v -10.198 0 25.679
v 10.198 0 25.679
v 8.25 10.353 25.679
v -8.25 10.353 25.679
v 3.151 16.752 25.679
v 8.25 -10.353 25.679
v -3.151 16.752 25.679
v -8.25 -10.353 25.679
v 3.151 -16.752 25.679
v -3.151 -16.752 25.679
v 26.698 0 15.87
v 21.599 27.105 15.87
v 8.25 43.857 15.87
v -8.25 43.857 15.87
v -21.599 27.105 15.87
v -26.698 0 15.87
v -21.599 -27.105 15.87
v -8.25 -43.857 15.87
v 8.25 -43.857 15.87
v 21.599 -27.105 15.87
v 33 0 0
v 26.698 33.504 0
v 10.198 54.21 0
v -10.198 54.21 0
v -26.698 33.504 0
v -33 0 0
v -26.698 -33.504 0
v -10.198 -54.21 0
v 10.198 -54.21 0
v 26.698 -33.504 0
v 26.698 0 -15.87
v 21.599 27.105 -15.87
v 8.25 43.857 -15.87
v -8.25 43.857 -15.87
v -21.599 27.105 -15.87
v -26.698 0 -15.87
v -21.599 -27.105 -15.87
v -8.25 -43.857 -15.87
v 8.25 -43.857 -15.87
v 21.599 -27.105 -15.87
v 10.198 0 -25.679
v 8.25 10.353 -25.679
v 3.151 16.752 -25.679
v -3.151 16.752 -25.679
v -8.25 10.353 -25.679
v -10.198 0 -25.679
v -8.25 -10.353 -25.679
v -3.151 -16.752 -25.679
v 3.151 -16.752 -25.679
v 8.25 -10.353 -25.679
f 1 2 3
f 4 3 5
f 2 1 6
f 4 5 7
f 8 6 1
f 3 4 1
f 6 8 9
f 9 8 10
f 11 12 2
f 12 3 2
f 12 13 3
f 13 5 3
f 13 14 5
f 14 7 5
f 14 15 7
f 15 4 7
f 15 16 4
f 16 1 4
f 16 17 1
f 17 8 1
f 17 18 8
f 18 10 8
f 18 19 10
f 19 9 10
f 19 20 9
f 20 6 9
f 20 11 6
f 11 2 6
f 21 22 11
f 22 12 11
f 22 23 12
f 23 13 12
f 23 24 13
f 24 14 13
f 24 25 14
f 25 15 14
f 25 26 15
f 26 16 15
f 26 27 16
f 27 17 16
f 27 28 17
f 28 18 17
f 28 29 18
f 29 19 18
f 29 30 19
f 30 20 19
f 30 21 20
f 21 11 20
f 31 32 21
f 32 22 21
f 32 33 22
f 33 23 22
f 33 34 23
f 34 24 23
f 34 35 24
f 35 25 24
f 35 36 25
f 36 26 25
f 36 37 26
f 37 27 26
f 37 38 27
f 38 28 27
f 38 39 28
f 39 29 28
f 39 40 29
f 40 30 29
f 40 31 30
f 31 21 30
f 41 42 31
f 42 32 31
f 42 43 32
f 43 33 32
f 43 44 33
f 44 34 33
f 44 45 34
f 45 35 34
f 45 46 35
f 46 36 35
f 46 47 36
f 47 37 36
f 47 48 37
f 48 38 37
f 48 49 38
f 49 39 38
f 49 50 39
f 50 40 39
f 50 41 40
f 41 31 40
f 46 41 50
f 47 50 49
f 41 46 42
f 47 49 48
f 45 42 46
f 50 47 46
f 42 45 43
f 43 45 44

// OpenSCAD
// Generated by SolidPython 1.0.1 on 2020-07-29 00:46:50


scale(v = [11, 19, 9]) {
	sphere(r = 3);
}
/***********************************************
*********      SolidPython code:      **********
************************************************
 
# import packages: SolidPython
from solid import *
from solid.utils import *
from itertools import chain, combinations, permutations


class Resize:

    def __init__(self, scad_file):
        self.scad_file = scad_file
        #self.scad_file = import_scad(scad_file)
        # cone/cylinder param:
        self.r1 = 0
        self.r2 = 0
        self.h = 0
        # rectangular prism param:
        self.w = 0
        self.l = 0
        # ellipse param:
        self.r = 0

    # import OpenScad code (file name corresponds to shape)


    # classify shape + parameters
    def assign(self, param1, param2, param3):
        if self.scad_file == 'cone.scad':
            self.r1 = param1
            self.r2 = param2
            self.h = param3
        elif self.scad_file == 'cylinder.scad':
            self.r1 = param1
            self.r2 = param2
            self.h = param3
        elif self.scad_file == 'rectangularPrism.scad':
            self.h = param1
            self.l = param2
            self.w = param3
        else:
            self.r = param1
            self.h = param2

    # resize parameters
    def iterate(self):
        x = range(3, 20, 2)
        i = 1
        if self.scad_file == 'cone.scad':
            tempList = list(permutations(x, 2))
            for temp in tempList:
                param1 = temp[0]
                param2 = temp[1]
                filepath = 'produced_scad_files/' + 'cone' + str(param1) + '_' + str(param2) + '_' + '.scad'
                scad_render_to_file(cylinder(h=param1, r1=param2, r2=0), filepath)

        elif self.scad_file == 'cylinder.scad':
            tempList = list(permutations(x, 3))
            for temp in tempList:
                param1 = temp[0]
                param2 = temp[1]
                filepath = 'produced_scad_files/' + 'cylinder' + str(param1) + '_' + str(param2) + '_' + '.scad'
                scad_render_to_file(cylinder(h=param1, r1=param2, r2=param2), filepath)

        elif self.scad_file == 'rectangularPrism.scad':
            tempList = list(permutations(x, 3))
            for temp in tempList:
                param1 = temp[0]
                param2 = temp[1]
                param3 = temp[2]
                filepath = 'produced_scad_files/' + 'rectangularPrism' + str(param1) + '_' + str(param2) + '_' + str(
                    param3) + '.scad'
                scad_render_to_file(cube(size=(param1, param2, param3)), filepath)

        elif self.scad_file == 'ellipse.scad':
            tempList = list(permutations(x, 4))
            for temp in tempList:
                param1 = temp[0]
                param2 = temp[1]
                param3 = temp[2]
                param4 = temp[3]
                filepath = 'produced_scad_files/' + 'ellipse' + str(param1) + '_' + str(param2) + '_' + str(param3) + '_' + str(param4) + '.scad'
                scad_render_to_file(scale([param1, param2, param3])(sphere(r=param4)), filepath)

    def render_to_scadfile(self):
        scad_render_to_file(scad, 'example.scad') 
 
************************************************/
